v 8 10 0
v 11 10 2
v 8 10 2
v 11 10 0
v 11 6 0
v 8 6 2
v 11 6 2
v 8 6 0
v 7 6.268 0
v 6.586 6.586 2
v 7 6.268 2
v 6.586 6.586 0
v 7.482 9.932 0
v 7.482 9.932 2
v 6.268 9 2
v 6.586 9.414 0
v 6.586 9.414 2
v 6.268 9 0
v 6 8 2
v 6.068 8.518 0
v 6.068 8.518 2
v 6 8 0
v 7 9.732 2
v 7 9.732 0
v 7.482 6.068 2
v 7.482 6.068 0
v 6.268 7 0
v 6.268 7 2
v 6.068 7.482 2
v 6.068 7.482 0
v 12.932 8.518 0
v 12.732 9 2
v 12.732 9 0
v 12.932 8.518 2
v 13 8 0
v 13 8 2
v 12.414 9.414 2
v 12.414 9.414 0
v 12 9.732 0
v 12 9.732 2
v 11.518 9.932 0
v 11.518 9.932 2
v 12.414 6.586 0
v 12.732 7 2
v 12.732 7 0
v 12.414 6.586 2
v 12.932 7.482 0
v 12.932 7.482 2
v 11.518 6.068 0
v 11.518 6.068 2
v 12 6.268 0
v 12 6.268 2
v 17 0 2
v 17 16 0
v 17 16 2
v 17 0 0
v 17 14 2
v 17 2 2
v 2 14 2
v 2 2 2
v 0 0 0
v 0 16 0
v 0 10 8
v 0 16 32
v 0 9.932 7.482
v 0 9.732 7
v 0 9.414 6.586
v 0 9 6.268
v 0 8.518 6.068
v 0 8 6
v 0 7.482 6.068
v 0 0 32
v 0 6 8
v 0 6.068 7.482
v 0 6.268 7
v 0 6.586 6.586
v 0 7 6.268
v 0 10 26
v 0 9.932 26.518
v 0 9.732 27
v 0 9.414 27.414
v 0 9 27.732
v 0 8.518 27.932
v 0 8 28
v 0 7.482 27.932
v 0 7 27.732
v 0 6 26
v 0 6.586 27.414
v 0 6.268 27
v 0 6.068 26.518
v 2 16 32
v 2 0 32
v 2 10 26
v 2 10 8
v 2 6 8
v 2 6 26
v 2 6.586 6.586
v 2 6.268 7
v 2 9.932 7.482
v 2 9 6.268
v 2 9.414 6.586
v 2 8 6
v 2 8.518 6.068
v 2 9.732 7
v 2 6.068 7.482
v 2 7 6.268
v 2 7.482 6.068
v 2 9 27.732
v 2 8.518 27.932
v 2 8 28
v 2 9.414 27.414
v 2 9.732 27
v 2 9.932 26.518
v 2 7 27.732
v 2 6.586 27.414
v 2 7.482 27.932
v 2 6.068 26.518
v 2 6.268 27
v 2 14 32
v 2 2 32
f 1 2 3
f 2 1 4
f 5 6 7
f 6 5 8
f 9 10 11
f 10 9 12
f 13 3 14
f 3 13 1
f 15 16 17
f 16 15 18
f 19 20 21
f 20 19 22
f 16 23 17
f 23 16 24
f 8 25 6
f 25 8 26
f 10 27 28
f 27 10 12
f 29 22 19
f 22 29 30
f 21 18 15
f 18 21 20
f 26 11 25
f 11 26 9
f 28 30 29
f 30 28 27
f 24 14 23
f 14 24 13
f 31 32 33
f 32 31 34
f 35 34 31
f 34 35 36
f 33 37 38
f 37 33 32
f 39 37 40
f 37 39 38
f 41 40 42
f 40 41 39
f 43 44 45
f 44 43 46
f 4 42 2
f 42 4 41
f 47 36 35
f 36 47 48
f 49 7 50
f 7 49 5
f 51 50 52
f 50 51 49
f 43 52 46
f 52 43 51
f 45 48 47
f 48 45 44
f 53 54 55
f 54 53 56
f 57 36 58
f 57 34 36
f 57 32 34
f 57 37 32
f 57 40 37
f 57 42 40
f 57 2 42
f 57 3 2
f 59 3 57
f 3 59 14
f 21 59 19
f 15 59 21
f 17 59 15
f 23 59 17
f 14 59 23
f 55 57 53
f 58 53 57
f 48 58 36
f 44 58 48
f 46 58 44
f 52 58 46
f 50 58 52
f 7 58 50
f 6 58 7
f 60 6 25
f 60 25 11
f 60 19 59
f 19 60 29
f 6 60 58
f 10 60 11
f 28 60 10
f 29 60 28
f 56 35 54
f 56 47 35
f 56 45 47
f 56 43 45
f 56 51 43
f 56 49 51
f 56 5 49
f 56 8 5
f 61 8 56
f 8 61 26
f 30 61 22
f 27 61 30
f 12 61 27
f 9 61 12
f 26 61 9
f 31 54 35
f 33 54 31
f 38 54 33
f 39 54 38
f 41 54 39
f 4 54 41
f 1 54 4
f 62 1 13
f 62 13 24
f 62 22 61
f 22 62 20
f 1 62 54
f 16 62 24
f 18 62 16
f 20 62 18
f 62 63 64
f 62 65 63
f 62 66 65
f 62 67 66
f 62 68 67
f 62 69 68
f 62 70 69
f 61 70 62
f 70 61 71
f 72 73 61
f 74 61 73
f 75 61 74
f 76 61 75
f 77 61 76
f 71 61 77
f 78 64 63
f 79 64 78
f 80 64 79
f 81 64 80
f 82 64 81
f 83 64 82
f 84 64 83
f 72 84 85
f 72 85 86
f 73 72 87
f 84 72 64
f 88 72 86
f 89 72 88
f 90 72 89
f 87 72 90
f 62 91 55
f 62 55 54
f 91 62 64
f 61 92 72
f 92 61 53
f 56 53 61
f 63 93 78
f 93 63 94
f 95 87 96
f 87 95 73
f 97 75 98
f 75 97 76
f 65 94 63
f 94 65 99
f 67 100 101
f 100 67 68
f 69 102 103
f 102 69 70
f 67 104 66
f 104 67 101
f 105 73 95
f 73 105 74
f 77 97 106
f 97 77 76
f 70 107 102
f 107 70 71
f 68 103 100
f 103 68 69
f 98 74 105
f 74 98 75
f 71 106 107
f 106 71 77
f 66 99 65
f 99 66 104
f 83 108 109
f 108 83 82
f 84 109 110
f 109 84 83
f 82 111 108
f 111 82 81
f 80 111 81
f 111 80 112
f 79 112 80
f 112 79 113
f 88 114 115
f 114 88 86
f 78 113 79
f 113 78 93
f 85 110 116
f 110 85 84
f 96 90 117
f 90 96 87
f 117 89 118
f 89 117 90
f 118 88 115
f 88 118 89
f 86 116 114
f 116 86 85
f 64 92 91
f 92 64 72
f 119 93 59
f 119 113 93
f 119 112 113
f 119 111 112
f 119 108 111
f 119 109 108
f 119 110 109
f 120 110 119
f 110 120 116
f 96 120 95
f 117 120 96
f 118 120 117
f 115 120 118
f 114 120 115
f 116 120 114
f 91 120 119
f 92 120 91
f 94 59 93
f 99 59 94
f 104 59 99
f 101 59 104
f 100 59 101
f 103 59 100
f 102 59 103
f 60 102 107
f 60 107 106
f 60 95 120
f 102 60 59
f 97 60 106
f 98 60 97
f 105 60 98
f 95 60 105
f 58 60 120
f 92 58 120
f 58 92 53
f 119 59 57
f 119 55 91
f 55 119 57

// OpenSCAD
//=============================================================================
// l-bracket.scad
//
// generates an l-bracket from the given parameters
//=============================================================================
// CHANGELOG
//
// v1.1 - makes side lengths independant, set $fn
// v1.0 - original release
//=============================================================================
// Written in 2018 by Patrick Barrett
//
// To the extent possible under law, the author(s) have dedicated all copyright
// and related and neighboring rights to this work to the public domain
// worldwide. This work is distributed without any warranty.
//
// See <http://creativecommons.org/publicdomain/zero/1.0/> for full dedication.
//=============================================================================

wall_thickness = 2;
internal_width = 12;
slot_width = 4;
side_length_v = 30;
side_length_h = 15;

// customizable variables end here

head_annulus = (internal_width/2) - (slot_width/2);

abit = 0.0001 * 1; //use for making overlap to get single manifold stl

$fn = 24;

module stadium3d(a, r, z, center = false){
	offset_x = center ? -(r + (a / 2)) : 0;
	offset_y = center ? -(r) : 0;
	offset_z = center ? -(z / 2) : 0;

	translate([offset_x, offset_y, offset_z])
	union() {
		translate([r, 0, 0])
			cube([a, 2*r, z]);
		translate([r, r, 0])
			cylinder(h = z, r = r, center = false);
		translate([r + a, r, 0])
			cylinder(h = z, r = r);
	}
}

union() {
	// horizontal wall
	difference() {
		cube([side_length_h + wall_thickness,
		      internal_width + 2*wall_thickness,
		      wall_thickness]);
		translate([wall_thickness + head_annulus,
		           wall_thickness + head_annulus,
		           -1])
			stadium3d(side_length_h - (2*head_annulus) - slot_width,
 			          slot_width / 2,
 			          wall_thickness + 2);
	}

	// vertiacle wall
	translate([wall_thickness, 0, 0])
	rotate([0,-90,0])
	difference() {
		cube([side_length_v + wall_thickness,
		      internal_width + 2*wall_thickness,
		      wall_thickness]);
		translate([wall_thickness + head_annulus,
		           wall_thickness + head_annulus,
		           -1])
			stadium3d(side_length_v - (2*head_annulus) - slot_width,
 			          slot_width / 2,
 			          wall_thickness + 2);
	}

	// bracer 1
	translate([wall_thickness - abit,
	           wall_thickness,
	           wall_thickness - abit])
	rotate([90,0,0])
	linear_extrude(height = wall_thickness) {
		polygon([[0,0],
		        [side_length_h,0],
		        [0,side_length_v]]);
	}

	// bracer 2
	translate([wall_thickness - abit,
	           2*wall_thickness + internal_width,
	           wall_thickness - abit])
	rotate([90,0,0])
	linear_extrude(height = wall_thickness) {
		polygon([[0,0],
		        [side_length_h,0],
		        [0,side_length_v]]);
	}
}
